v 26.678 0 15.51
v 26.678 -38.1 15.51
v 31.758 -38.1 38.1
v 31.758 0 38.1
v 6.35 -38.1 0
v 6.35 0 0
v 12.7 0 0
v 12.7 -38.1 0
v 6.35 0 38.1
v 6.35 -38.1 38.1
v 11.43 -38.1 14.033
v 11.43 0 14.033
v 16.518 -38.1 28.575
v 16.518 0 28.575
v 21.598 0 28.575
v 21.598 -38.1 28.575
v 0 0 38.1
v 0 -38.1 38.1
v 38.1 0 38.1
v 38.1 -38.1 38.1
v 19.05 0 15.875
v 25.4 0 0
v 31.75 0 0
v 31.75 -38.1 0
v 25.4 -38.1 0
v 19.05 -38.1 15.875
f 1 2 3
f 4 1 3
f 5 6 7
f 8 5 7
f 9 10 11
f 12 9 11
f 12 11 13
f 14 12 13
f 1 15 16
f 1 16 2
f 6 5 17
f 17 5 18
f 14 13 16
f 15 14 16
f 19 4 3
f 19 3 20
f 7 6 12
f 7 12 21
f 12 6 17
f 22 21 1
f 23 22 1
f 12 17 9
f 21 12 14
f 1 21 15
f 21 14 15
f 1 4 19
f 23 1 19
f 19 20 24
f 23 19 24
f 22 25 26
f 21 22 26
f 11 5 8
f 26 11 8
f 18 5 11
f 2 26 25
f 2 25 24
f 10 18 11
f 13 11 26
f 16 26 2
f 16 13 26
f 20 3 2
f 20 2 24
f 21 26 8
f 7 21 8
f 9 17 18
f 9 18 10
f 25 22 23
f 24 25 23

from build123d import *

# Parameters (mm, degrees)
F0_W     = 38.1
F0_H     = 38.1
F1_DEPTH = 38.1
F4_DEPTH = 38.1


with BuildPart() as f1:
    # F0 (on Front) → F1 (new body)
    with BuildSketch(Plane.XZ):
        with Locations((19.05, 19.05)):
            Rectangle(F0_W, F0_H)
    extrude(amount=F1_DEPTH)

    # F3 (on face) → F4 (cut)
    with BuildSketch(Plane.XZ.offset(38.1)):
        Polygon((31.757813, 38.1), (6.35, 38.1), (11.43, 14.032523), (16.517813, 28.575), (21.597813, 28.575), (26.677813, 15.509631), align=None)
        Polygon((6.35, 0), (0, 38.1), (0, 0), align=None)
        Polygon((19.05, 15.875), (12.7, 0), (25.4, 0), align=None)
        Polygon((38.1, 0), (38.1, 38.1), (31.75, 0), align=None)
    extrude(amount=-F4_DEPTH, mode=Mode.SUBTRACT)


solid = f1.part
